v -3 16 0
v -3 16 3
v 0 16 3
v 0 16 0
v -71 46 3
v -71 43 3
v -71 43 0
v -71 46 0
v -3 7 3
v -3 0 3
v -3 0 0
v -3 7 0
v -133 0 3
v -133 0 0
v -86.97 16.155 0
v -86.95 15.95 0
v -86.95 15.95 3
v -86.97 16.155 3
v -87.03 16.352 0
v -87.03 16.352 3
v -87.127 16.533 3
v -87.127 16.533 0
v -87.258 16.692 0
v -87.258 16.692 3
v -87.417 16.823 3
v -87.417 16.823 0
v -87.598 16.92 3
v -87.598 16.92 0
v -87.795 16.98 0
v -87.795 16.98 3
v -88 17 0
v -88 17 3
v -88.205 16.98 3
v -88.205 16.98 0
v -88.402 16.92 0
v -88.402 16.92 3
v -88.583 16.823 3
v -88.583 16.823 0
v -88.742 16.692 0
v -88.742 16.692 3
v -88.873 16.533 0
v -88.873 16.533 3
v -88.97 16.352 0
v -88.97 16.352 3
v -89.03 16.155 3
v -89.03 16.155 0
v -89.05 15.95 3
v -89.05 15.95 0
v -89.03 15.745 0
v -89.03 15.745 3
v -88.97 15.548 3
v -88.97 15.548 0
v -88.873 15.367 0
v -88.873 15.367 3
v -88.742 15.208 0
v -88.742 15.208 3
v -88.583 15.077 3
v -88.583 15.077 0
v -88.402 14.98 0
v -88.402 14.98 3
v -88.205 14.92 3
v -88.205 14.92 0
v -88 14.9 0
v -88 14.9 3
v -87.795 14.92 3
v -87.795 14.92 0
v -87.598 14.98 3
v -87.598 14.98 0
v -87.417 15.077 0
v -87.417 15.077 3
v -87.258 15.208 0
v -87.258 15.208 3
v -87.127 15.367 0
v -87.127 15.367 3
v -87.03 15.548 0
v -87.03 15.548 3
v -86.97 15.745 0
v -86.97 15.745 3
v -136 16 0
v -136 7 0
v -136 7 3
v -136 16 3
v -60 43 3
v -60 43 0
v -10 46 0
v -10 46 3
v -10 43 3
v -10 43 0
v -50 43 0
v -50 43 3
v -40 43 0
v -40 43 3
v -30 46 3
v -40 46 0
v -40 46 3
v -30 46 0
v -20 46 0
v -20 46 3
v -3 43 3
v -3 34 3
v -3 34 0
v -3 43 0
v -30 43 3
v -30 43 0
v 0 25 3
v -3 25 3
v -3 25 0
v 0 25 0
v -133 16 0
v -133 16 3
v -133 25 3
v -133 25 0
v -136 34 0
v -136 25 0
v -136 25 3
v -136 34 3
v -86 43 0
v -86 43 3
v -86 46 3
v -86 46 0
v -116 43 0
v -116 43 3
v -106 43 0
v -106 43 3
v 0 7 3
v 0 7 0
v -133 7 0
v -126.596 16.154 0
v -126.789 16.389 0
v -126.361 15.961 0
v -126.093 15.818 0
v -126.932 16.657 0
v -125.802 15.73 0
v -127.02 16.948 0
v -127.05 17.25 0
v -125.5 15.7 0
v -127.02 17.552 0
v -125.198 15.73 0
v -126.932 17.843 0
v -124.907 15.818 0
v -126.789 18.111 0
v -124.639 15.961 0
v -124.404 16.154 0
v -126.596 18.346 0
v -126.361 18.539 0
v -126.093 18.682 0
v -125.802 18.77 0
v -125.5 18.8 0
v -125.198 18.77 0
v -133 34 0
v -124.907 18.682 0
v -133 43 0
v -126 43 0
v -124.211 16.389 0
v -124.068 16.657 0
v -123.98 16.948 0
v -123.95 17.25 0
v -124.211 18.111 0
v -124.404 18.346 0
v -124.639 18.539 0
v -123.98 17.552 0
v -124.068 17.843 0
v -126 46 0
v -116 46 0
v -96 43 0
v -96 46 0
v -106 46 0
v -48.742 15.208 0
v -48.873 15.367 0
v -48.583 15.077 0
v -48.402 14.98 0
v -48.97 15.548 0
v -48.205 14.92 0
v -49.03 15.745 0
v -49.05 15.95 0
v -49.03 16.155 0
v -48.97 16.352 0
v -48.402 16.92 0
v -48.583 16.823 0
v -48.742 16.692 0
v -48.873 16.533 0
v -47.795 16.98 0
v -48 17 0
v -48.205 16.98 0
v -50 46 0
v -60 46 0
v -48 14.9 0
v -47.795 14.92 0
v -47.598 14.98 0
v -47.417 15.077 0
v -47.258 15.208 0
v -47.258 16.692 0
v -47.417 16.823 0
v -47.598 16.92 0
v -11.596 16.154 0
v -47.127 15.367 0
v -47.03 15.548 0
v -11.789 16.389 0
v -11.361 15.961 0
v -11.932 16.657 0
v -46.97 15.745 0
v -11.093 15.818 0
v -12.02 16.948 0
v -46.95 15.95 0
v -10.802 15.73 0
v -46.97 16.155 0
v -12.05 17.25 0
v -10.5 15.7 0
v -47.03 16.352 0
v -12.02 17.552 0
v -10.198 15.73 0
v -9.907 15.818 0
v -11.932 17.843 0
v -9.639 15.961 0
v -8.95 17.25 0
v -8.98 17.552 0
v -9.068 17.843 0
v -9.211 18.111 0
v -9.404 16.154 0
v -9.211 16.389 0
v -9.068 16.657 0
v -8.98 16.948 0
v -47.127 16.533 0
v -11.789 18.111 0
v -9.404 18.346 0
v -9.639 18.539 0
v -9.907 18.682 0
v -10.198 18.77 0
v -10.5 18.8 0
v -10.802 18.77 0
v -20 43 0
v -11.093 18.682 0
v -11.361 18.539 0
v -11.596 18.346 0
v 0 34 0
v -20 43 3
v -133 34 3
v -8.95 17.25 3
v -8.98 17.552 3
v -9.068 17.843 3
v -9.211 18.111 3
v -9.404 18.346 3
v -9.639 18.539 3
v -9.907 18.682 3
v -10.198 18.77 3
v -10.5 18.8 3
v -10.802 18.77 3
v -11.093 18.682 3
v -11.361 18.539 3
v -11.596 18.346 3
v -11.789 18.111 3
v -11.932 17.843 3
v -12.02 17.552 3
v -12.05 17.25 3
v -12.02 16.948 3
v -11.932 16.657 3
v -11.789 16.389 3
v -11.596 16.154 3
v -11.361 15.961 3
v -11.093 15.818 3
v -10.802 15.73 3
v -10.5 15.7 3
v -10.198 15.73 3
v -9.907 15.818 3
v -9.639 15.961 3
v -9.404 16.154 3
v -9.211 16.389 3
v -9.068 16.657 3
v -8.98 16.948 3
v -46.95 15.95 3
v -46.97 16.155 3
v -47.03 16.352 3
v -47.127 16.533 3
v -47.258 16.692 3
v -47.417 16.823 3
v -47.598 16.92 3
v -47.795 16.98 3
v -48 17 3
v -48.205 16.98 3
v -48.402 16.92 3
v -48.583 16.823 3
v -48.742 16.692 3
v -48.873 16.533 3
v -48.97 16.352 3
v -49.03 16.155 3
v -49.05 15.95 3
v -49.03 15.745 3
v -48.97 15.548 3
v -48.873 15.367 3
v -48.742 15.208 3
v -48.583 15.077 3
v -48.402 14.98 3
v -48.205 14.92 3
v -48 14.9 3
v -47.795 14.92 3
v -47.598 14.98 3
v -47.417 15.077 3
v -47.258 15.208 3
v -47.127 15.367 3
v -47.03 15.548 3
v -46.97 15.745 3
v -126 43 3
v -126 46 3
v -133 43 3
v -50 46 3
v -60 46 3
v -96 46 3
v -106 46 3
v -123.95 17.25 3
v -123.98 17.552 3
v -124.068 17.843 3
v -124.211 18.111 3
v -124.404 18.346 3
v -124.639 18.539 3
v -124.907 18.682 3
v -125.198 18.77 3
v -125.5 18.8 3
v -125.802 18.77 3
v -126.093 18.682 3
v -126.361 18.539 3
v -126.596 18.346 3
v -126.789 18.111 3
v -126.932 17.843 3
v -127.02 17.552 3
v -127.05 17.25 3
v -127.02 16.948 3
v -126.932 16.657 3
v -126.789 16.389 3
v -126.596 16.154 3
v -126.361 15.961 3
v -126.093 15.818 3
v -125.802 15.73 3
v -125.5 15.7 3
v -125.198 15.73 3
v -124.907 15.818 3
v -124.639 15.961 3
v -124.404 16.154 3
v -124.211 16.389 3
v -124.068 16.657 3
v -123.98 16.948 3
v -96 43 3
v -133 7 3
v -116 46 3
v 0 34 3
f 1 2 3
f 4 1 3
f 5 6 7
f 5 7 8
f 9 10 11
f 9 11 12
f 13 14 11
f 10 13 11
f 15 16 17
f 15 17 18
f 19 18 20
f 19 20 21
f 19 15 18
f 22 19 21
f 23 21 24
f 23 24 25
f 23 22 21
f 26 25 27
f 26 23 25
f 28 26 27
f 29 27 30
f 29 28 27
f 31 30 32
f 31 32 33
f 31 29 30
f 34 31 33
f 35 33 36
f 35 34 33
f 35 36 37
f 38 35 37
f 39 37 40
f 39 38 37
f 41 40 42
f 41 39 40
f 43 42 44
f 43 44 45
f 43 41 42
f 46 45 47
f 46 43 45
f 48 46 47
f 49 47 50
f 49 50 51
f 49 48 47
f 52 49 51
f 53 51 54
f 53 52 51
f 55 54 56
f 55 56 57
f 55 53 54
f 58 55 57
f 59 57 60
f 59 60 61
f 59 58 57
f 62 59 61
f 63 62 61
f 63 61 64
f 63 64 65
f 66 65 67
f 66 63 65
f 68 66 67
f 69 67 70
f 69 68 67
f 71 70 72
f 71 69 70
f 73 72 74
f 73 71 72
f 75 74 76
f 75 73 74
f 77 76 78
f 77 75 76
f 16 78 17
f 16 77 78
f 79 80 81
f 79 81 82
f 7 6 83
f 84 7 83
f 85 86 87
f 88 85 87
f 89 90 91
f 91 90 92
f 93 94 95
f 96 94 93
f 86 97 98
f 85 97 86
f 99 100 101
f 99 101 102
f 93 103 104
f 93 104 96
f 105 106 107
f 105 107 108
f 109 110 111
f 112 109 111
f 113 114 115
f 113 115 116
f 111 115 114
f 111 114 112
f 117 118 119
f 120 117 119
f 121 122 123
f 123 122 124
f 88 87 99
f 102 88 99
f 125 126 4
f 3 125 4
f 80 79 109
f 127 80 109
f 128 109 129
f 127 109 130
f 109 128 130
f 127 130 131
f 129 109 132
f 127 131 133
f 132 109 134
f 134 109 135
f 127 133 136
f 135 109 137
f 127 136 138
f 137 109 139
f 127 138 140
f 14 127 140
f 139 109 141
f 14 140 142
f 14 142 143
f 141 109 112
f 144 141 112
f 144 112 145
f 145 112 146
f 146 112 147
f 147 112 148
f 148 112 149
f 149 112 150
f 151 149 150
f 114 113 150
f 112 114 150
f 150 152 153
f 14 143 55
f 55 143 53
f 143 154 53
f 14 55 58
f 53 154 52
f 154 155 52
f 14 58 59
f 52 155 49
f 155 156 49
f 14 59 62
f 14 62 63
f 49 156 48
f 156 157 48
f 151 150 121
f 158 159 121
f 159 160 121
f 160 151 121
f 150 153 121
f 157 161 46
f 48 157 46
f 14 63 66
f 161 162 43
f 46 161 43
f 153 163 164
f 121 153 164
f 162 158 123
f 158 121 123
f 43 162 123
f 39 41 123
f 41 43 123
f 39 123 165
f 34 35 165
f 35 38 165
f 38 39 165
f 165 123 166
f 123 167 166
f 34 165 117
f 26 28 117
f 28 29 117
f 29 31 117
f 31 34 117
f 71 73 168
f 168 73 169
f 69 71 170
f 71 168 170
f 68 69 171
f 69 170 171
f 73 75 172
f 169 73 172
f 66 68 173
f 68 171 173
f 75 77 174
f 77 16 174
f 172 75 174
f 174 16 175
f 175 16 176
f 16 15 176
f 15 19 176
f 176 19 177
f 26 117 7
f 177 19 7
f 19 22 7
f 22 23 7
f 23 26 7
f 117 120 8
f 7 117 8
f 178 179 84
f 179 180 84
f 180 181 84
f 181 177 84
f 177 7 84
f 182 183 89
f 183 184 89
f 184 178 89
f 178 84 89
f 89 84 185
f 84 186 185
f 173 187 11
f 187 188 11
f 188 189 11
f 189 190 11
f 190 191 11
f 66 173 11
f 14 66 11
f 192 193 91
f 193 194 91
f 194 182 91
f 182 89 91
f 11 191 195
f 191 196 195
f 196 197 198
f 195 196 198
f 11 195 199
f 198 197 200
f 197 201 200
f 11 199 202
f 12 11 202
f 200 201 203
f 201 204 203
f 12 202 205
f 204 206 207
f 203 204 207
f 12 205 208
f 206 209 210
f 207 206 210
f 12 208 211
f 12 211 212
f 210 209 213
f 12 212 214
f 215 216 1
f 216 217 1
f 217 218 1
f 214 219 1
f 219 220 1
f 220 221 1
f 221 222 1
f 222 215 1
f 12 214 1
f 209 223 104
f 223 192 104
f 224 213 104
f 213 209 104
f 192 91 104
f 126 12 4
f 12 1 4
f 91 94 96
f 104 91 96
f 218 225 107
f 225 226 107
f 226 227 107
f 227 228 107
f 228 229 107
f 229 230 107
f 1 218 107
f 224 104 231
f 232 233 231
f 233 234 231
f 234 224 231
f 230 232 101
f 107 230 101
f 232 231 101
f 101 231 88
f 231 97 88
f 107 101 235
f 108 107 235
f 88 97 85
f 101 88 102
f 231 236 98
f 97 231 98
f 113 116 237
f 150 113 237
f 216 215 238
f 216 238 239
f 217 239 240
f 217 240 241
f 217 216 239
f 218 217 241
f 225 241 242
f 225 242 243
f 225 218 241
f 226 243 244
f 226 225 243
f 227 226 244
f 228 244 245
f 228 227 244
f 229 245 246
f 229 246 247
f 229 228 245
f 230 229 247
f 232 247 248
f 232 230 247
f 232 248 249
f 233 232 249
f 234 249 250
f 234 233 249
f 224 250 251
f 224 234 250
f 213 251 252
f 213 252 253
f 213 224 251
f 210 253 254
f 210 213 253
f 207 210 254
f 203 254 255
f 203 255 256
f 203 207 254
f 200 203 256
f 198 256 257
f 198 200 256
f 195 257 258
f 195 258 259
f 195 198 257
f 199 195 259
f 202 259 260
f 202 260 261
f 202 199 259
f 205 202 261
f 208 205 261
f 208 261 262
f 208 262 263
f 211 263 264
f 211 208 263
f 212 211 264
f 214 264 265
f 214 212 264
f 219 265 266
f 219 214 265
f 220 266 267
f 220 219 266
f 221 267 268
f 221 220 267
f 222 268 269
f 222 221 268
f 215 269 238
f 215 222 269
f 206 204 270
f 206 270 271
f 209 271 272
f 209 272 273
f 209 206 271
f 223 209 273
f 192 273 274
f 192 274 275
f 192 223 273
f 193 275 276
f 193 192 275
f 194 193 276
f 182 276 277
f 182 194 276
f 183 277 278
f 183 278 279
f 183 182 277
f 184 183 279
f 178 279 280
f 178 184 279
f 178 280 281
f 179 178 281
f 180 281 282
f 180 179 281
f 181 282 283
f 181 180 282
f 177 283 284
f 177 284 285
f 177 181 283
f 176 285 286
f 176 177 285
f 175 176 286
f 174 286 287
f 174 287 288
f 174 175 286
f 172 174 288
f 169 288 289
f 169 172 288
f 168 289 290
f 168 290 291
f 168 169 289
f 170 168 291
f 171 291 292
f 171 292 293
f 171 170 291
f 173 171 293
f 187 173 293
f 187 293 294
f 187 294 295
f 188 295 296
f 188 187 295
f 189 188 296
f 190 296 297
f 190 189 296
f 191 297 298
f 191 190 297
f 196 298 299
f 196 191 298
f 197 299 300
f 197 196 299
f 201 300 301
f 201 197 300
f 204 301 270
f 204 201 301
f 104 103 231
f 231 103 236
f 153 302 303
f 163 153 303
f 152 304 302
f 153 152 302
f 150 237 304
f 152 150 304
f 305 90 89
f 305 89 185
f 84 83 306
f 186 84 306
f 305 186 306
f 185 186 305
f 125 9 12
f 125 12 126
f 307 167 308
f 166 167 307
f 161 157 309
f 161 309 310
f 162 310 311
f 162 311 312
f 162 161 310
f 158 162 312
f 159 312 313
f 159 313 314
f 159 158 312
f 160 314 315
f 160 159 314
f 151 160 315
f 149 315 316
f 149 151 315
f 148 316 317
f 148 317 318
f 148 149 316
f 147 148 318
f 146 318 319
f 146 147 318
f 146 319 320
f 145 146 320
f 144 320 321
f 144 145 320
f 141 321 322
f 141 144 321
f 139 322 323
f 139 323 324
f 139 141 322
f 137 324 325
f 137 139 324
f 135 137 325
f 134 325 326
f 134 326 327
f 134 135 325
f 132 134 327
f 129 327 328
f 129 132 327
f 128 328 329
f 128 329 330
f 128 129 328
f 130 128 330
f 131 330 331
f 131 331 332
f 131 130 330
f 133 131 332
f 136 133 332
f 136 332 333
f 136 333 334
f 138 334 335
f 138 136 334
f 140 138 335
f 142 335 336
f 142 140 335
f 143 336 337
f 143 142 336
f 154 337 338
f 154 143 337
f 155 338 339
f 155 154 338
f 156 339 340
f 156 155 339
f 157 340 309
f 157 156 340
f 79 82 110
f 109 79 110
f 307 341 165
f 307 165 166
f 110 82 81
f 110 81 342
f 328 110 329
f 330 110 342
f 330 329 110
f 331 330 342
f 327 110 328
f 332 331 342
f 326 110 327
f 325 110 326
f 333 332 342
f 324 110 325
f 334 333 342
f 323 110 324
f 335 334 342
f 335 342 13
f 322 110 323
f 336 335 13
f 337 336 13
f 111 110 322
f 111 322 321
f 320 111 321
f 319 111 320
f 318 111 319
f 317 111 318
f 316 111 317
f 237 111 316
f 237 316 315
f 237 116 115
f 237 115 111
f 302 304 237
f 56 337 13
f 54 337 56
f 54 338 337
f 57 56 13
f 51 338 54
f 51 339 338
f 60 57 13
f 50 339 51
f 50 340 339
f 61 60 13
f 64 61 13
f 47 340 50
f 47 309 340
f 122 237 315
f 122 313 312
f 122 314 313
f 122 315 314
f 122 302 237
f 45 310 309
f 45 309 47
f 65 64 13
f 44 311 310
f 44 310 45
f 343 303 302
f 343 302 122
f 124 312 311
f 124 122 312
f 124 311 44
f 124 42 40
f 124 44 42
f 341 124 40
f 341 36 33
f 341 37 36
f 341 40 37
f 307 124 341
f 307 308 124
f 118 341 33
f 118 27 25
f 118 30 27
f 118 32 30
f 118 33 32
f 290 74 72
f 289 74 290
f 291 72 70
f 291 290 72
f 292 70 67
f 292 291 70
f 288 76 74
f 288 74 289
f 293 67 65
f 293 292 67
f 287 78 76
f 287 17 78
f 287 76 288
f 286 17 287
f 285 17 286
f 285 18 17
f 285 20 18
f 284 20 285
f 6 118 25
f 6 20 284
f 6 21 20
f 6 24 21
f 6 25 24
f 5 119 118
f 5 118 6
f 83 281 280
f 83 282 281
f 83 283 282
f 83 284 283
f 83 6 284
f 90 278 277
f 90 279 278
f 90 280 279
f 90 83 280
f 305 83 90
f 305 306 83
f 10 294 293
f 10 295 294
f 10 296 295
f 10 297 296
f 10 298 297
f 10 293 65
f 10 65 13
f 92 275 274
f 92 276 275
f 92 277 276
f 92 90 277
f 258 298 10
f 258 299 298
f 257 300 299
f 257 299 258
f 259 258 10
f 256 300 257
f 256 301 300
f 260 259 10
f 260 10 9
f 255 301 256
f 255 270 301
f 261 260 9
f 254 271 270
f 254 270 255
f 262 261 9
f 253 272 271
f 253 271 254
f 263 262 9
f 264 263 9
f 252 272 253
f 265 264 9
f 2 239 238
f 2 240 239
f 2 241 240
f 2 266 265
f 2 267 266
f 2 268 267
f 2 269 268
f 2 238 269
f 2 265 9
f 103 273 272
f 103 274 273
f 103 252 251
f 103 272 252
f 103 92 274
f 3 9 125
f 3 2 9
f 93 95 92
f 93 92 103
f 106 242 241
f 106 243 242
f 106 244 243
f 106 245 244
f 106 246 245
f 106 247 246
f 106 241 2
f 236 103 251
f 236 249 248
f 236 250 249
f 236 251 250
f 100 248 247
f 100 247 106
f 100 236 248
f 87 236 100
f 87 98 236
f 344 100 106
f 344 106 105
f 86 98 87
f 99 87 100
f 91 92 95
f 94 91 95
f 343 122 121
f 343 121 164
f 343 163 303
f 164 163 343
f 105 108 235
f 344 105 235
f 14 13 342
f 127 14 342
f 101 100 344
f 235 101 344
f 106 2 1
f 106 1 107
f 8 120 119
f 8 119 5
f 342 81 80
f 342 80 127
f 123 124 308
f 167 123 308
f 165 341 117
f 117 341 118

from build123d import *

# Parameters (mm, degrees)
SKETCH1_W           = 136
SKETCH1_H           = 46
SKETCH1_R           = 1.05
SKETCH1_R_2         = 1.55
BOSS_EXTRUDE1_DEPTH = 3
CUT_EXTRUDE1_REACH  = 5
SKETCH2_W           = 11
SKETCH2_H           = 3
SKETCH2_W_2         = 10
SKETCH2_W_3         = 3
SKETCH2_H_2         = 9
SKETCH2_H_3         = 7


with BuildPart() as part:
    # Sketch1 → Boss-Extrude1 (new body)
    with BuildSketch(Plane.XY):
        with Locations((-68, 23)):
            Rectangle(SKETCH1_W, SKETCH1_H)
        with Locations((-88, 15.95)):
            Circle(SKETCH1_R, mode=Mode.SUBTRACT)
        with Locations((-125.5, 17.25)):
            Circle(SKETCH1_R_2, mode=Mode.SUBTRACT)
        with Locations((-48, 15.95)):
            Circle(SKETCH1_R, mode=Mode.SUBTRACT)
        with Locations((-10.5, 17.25)):
            Circle(SKETCH1_R_2, mode=Mode.SUBTRACT)
    extrude(amount=BOSS_EXTRUDE1_DEPTH)

    # Sketch2 → Cut-Extrude1 (cut, up to next)
    with BuildSketch(Plane.XY.offset(3), mode=Mode.PRIVATE) as cut_extrude1_sk1:
        with Locations((-65.5, 44.5)):
            Rectangle(SKETCH2_W, SKETCH2_H)
    cut_extrude1_tool1 = extrude(cut_extrude1_sk1.sketch, amount=-CUT_EXTRUDE1_REACH, mode=Mode.PRIVATE) & part.part
    add(cut_extrude1_tool1.solids().sort_by_distance((-65.5, 44.5, 3))[0], mode=Mode.SUBTRACT)
    # Sketch2 → Cut-Extrude1 (cut, up to next)
    with BuildSketch(Plane.XY.offset(3), mode=Mode.PRIVATE) as cut_extrude1_sk2:
        with Locations((-91, 44.5)):
            Rectangle(SKETCH2_W_2, SKETCH2_H)
    cut_extrude1_tool2 = extrude(cut_extrude1_sk2.sketch, amount=-CUT_EXTRUDE1_REACH, mode=Mode.PRIVATE) & part.part
    add(cut_extrude1_tool2.solids().sort_by_distance((-91, 44.5, 3))[0], mode=Mode.SUBTRACT)
    # Sketch2 → Cut-Extrude1 (cut, up to next)
    with BuildSketch(Plane.XY.offset(3), mode=Mode.PRIVATE) as cut_extrude1_sk3:
        with Locations((-111, 44.5)):
            Rectangle(SKETCH2_W_2, SKETCH2_H)
    cut_extrude1_tool3 = extrude(cut_extrude1_sk3.sketch, amount=-CUT_EXTRUDE1_REACH, mode=Mode.PRIVATE) & part.part
    add(cut_extrude1_tool3.solids().sort_by_distance((-111, 44.5, 3))[0], mode=Mode.SUBTRACT)
    # Sketch2 → Cut-Extrude1 (cut, up to next)
    with BuildSketch(Plane.XY.offset(3), mode=Mode.PRIVATE) as cut_extrude1_sk4:
        Polygon((-136, 43), (-133, 43), (-126, 43), (-126, 46), (-136, 46), align=None)
    cut_extrude1_tool4 = extrude(cut_extrude1_sk4.sketch, amount=-CUT_EXTRUDE1_REACH, mode=Mode.PRIVATE) & part.part
    add(cut_extrude1_tool4.solids().sort_by_distance((-131, 44.5, 3))[0], mode=Mode.SUBTRACT)
    # Sketch2 → Cut-Extrude1 (cut, up to next)
    with BuildSketch(Plane.XY.offset(3), mode=Mode.PRIVATE) as cut_extrude1_sk5:
        with Locations((-134.5, 38.5)):
            Rectangle(SKETCH2_W_3, SKETCH2_H_2)
    cut_extrude1_tool5 = extrude(cut_extrude1_sk5.sketch, amount=-CUT_EXTRUDE1_REACH, mode=Mode.PRIVATE) & part.part
    add(cut_extrude1_tool5.solids().sort_by_distance((-134.5, 38.5, 3))[0], mode=Mode.SUBTRACT)
    # Sketch2 → Cut-Extrude1 (cut, up to next)
    with BuildSketch(Plane.XY.offset(3), mode=Mode.PRIVATE) as cut_extrude1_sk6:
        with Locations((-134.5, 20.5)):
            Rectangle(SKETCH2_W_3, SKETCH2_H_2)
    cut_extrude1_tool6 = extrude(cut_extrude1_sk6.sketch, amount=-CUT_EXTRUDE1_REACH, mode=Mode.PRIVATE) & part.part
    add(cut_extrude1_tool6.solids().sort_by_distance((-134.5, 20.5, 3))[0], mode=Mode.SUBTRACT)
    # Sketch2 → Cut-Extrude1 (cut, up to next)
    with BuildSketch(Plane.XY.offset(3), mode=Mode.PRIVATE) as cut_extrude1_sk7:
        with Locations((-134.5, 3.5)):
            Rectangle(SKETCH2_W_3, SKETCH2_H_3)
    cut_extrude1_tool7 = extrude(cut_extrude1_sk7.sketch, amount=-CUT_EXTRUDE1_REACH, mode=Mode.PRIVATE) & part.part
    add(cut_extrude1_tool7.solids().sort_by_distance((-134.5, 3.5, 3))[0], mode=Mode.SUBTRACT)
    # Sketch2 → Cut-Extrude1 (cut, up to next)
    with BuildSketch(Plane.XY.offset(3), mode=Mode.PRIVATE) as cut_extrude1_sk8:
        with Locations((-1.5, 3.5)):
            Rectangle(SKETCH2_W_3, SKETCH2_H_3)
    cut_extrude1_tool8 = extrude(cut_extrude1_sk8.sketch, amount=-CUT_EXTRUDE1_REACH, mode=Mode.PRIVATE) & part.part
    add(cut_extrude1_tool8.solids().sort_by_distance((-1.5, 3.5, 3))[0], mode=Mode.SUBTRACT)
    # Sketch2 → Cut-Extrude1 (cut, up to next)
    with BuildSketch(Plane.XY.offset(3), mode=Mode.PRIVATE) as cut_extrude1_sk9:
        with Locations((-1.5, 20.5)):
            Rectangle(SKETCH2_W_3, SKETCH2_H_2)
    cut_extrude1_tool9 = extrude(cut_extrude1_sk9.sketch, amount=-CUT_EXTRUDE1_REACH, mode=Mode.PRIVATE) & part.part
    add(cut_extrude1_tool9.solids().sort_by_distance((-1.5, 20.5, 3))[0], mode=Mode.SUBTRACT)
    # Sketch2 → Cut-Extrude1 (cut, up to next)
    with BuildSketch(Plane.XY.offset(3), mode=Mode.PRIVATE) as cut_extrude1_sk10:
        with Locations((-1.5, 38.5)):
            Rectangle(SKETCH2_W_3, SKETCH2_H_2)
    cut_extrude1_tool10 = extrude(cut_extrude1_sk10.sketch, amount=-CUT_EXTRUDE1_REACH, mode=Mode.PRIVATE) & part.part
    add(cut_extrude1_tool10.solids().sort_by_distance((-1.5, 38.5, 3))[0], mode=Mode.SUBTRACT)
    # Sketch2 → Cut-Extrude1 (cut, up to next)
    with BuildSketch(Plane.XY.offset(3), mode=Mode.PRIVATE) as cut_extrude1_sk11:
        Polygon((0, 46), (-10, 46), (-10, 43), (-3, 43), (0, 43), align=None)
    cut_extrude1_tool11 = extrude(cut_extrude1_sk11.sketch, amount=-CUT_EXTRUDE1_REACH, mode=Mode.PRIVATE) & part.part
    add(cut_extrude1_tool11.solids().sort_by_distance((-5, 44.5, 3))[0], mode=Mode.SUBTRACT)
    # Sketch2 → Cut-Extrude1 (cut, up to next)
    with BuildSketch(Plane.XY.offset(3), mode=Mode.PRIVATE) as cut_extrude1_sk12:
        with Locations((-25, 44.5)):
            Rectangle(SKETCH2_W_2, SKETCH2_H)
    cut_extrude1_tool12 = extrude(cut_extrude1_sk12.sketch, amount=-CUT_EXTRUDE1_REACH, mode=Mode.PRIVATE) & part.part
    add(cut_extrude1_tool12.solids().sort_by_distance((-25, 44.5, 3))[0], mode=Mode.SUBTRACT)
    # Sketch2 → Cut-Extrude1 (cut, up to next)
    with BuildSketch(Plane.XY.offset(3), mode=Mode.PRIVATE) as cut_extrude1_sk13:
        with Locations((-45, 44.5)):
            Rectangle(SKETCH2_W_2, SKETCH2_H)
    cut_extrude1_tool13 = extrude(cut_extrude1_sk13.sketch, amount=-CUT_EXTRUDE1_REACH, mode=Mode.PRIVATE) & part.part
    add(cut_extrude1_tool13.solids().sort_by_distance((-45, 44.5, 3))[0], mode=Mode.SUBTRACT)


solid = part.part
